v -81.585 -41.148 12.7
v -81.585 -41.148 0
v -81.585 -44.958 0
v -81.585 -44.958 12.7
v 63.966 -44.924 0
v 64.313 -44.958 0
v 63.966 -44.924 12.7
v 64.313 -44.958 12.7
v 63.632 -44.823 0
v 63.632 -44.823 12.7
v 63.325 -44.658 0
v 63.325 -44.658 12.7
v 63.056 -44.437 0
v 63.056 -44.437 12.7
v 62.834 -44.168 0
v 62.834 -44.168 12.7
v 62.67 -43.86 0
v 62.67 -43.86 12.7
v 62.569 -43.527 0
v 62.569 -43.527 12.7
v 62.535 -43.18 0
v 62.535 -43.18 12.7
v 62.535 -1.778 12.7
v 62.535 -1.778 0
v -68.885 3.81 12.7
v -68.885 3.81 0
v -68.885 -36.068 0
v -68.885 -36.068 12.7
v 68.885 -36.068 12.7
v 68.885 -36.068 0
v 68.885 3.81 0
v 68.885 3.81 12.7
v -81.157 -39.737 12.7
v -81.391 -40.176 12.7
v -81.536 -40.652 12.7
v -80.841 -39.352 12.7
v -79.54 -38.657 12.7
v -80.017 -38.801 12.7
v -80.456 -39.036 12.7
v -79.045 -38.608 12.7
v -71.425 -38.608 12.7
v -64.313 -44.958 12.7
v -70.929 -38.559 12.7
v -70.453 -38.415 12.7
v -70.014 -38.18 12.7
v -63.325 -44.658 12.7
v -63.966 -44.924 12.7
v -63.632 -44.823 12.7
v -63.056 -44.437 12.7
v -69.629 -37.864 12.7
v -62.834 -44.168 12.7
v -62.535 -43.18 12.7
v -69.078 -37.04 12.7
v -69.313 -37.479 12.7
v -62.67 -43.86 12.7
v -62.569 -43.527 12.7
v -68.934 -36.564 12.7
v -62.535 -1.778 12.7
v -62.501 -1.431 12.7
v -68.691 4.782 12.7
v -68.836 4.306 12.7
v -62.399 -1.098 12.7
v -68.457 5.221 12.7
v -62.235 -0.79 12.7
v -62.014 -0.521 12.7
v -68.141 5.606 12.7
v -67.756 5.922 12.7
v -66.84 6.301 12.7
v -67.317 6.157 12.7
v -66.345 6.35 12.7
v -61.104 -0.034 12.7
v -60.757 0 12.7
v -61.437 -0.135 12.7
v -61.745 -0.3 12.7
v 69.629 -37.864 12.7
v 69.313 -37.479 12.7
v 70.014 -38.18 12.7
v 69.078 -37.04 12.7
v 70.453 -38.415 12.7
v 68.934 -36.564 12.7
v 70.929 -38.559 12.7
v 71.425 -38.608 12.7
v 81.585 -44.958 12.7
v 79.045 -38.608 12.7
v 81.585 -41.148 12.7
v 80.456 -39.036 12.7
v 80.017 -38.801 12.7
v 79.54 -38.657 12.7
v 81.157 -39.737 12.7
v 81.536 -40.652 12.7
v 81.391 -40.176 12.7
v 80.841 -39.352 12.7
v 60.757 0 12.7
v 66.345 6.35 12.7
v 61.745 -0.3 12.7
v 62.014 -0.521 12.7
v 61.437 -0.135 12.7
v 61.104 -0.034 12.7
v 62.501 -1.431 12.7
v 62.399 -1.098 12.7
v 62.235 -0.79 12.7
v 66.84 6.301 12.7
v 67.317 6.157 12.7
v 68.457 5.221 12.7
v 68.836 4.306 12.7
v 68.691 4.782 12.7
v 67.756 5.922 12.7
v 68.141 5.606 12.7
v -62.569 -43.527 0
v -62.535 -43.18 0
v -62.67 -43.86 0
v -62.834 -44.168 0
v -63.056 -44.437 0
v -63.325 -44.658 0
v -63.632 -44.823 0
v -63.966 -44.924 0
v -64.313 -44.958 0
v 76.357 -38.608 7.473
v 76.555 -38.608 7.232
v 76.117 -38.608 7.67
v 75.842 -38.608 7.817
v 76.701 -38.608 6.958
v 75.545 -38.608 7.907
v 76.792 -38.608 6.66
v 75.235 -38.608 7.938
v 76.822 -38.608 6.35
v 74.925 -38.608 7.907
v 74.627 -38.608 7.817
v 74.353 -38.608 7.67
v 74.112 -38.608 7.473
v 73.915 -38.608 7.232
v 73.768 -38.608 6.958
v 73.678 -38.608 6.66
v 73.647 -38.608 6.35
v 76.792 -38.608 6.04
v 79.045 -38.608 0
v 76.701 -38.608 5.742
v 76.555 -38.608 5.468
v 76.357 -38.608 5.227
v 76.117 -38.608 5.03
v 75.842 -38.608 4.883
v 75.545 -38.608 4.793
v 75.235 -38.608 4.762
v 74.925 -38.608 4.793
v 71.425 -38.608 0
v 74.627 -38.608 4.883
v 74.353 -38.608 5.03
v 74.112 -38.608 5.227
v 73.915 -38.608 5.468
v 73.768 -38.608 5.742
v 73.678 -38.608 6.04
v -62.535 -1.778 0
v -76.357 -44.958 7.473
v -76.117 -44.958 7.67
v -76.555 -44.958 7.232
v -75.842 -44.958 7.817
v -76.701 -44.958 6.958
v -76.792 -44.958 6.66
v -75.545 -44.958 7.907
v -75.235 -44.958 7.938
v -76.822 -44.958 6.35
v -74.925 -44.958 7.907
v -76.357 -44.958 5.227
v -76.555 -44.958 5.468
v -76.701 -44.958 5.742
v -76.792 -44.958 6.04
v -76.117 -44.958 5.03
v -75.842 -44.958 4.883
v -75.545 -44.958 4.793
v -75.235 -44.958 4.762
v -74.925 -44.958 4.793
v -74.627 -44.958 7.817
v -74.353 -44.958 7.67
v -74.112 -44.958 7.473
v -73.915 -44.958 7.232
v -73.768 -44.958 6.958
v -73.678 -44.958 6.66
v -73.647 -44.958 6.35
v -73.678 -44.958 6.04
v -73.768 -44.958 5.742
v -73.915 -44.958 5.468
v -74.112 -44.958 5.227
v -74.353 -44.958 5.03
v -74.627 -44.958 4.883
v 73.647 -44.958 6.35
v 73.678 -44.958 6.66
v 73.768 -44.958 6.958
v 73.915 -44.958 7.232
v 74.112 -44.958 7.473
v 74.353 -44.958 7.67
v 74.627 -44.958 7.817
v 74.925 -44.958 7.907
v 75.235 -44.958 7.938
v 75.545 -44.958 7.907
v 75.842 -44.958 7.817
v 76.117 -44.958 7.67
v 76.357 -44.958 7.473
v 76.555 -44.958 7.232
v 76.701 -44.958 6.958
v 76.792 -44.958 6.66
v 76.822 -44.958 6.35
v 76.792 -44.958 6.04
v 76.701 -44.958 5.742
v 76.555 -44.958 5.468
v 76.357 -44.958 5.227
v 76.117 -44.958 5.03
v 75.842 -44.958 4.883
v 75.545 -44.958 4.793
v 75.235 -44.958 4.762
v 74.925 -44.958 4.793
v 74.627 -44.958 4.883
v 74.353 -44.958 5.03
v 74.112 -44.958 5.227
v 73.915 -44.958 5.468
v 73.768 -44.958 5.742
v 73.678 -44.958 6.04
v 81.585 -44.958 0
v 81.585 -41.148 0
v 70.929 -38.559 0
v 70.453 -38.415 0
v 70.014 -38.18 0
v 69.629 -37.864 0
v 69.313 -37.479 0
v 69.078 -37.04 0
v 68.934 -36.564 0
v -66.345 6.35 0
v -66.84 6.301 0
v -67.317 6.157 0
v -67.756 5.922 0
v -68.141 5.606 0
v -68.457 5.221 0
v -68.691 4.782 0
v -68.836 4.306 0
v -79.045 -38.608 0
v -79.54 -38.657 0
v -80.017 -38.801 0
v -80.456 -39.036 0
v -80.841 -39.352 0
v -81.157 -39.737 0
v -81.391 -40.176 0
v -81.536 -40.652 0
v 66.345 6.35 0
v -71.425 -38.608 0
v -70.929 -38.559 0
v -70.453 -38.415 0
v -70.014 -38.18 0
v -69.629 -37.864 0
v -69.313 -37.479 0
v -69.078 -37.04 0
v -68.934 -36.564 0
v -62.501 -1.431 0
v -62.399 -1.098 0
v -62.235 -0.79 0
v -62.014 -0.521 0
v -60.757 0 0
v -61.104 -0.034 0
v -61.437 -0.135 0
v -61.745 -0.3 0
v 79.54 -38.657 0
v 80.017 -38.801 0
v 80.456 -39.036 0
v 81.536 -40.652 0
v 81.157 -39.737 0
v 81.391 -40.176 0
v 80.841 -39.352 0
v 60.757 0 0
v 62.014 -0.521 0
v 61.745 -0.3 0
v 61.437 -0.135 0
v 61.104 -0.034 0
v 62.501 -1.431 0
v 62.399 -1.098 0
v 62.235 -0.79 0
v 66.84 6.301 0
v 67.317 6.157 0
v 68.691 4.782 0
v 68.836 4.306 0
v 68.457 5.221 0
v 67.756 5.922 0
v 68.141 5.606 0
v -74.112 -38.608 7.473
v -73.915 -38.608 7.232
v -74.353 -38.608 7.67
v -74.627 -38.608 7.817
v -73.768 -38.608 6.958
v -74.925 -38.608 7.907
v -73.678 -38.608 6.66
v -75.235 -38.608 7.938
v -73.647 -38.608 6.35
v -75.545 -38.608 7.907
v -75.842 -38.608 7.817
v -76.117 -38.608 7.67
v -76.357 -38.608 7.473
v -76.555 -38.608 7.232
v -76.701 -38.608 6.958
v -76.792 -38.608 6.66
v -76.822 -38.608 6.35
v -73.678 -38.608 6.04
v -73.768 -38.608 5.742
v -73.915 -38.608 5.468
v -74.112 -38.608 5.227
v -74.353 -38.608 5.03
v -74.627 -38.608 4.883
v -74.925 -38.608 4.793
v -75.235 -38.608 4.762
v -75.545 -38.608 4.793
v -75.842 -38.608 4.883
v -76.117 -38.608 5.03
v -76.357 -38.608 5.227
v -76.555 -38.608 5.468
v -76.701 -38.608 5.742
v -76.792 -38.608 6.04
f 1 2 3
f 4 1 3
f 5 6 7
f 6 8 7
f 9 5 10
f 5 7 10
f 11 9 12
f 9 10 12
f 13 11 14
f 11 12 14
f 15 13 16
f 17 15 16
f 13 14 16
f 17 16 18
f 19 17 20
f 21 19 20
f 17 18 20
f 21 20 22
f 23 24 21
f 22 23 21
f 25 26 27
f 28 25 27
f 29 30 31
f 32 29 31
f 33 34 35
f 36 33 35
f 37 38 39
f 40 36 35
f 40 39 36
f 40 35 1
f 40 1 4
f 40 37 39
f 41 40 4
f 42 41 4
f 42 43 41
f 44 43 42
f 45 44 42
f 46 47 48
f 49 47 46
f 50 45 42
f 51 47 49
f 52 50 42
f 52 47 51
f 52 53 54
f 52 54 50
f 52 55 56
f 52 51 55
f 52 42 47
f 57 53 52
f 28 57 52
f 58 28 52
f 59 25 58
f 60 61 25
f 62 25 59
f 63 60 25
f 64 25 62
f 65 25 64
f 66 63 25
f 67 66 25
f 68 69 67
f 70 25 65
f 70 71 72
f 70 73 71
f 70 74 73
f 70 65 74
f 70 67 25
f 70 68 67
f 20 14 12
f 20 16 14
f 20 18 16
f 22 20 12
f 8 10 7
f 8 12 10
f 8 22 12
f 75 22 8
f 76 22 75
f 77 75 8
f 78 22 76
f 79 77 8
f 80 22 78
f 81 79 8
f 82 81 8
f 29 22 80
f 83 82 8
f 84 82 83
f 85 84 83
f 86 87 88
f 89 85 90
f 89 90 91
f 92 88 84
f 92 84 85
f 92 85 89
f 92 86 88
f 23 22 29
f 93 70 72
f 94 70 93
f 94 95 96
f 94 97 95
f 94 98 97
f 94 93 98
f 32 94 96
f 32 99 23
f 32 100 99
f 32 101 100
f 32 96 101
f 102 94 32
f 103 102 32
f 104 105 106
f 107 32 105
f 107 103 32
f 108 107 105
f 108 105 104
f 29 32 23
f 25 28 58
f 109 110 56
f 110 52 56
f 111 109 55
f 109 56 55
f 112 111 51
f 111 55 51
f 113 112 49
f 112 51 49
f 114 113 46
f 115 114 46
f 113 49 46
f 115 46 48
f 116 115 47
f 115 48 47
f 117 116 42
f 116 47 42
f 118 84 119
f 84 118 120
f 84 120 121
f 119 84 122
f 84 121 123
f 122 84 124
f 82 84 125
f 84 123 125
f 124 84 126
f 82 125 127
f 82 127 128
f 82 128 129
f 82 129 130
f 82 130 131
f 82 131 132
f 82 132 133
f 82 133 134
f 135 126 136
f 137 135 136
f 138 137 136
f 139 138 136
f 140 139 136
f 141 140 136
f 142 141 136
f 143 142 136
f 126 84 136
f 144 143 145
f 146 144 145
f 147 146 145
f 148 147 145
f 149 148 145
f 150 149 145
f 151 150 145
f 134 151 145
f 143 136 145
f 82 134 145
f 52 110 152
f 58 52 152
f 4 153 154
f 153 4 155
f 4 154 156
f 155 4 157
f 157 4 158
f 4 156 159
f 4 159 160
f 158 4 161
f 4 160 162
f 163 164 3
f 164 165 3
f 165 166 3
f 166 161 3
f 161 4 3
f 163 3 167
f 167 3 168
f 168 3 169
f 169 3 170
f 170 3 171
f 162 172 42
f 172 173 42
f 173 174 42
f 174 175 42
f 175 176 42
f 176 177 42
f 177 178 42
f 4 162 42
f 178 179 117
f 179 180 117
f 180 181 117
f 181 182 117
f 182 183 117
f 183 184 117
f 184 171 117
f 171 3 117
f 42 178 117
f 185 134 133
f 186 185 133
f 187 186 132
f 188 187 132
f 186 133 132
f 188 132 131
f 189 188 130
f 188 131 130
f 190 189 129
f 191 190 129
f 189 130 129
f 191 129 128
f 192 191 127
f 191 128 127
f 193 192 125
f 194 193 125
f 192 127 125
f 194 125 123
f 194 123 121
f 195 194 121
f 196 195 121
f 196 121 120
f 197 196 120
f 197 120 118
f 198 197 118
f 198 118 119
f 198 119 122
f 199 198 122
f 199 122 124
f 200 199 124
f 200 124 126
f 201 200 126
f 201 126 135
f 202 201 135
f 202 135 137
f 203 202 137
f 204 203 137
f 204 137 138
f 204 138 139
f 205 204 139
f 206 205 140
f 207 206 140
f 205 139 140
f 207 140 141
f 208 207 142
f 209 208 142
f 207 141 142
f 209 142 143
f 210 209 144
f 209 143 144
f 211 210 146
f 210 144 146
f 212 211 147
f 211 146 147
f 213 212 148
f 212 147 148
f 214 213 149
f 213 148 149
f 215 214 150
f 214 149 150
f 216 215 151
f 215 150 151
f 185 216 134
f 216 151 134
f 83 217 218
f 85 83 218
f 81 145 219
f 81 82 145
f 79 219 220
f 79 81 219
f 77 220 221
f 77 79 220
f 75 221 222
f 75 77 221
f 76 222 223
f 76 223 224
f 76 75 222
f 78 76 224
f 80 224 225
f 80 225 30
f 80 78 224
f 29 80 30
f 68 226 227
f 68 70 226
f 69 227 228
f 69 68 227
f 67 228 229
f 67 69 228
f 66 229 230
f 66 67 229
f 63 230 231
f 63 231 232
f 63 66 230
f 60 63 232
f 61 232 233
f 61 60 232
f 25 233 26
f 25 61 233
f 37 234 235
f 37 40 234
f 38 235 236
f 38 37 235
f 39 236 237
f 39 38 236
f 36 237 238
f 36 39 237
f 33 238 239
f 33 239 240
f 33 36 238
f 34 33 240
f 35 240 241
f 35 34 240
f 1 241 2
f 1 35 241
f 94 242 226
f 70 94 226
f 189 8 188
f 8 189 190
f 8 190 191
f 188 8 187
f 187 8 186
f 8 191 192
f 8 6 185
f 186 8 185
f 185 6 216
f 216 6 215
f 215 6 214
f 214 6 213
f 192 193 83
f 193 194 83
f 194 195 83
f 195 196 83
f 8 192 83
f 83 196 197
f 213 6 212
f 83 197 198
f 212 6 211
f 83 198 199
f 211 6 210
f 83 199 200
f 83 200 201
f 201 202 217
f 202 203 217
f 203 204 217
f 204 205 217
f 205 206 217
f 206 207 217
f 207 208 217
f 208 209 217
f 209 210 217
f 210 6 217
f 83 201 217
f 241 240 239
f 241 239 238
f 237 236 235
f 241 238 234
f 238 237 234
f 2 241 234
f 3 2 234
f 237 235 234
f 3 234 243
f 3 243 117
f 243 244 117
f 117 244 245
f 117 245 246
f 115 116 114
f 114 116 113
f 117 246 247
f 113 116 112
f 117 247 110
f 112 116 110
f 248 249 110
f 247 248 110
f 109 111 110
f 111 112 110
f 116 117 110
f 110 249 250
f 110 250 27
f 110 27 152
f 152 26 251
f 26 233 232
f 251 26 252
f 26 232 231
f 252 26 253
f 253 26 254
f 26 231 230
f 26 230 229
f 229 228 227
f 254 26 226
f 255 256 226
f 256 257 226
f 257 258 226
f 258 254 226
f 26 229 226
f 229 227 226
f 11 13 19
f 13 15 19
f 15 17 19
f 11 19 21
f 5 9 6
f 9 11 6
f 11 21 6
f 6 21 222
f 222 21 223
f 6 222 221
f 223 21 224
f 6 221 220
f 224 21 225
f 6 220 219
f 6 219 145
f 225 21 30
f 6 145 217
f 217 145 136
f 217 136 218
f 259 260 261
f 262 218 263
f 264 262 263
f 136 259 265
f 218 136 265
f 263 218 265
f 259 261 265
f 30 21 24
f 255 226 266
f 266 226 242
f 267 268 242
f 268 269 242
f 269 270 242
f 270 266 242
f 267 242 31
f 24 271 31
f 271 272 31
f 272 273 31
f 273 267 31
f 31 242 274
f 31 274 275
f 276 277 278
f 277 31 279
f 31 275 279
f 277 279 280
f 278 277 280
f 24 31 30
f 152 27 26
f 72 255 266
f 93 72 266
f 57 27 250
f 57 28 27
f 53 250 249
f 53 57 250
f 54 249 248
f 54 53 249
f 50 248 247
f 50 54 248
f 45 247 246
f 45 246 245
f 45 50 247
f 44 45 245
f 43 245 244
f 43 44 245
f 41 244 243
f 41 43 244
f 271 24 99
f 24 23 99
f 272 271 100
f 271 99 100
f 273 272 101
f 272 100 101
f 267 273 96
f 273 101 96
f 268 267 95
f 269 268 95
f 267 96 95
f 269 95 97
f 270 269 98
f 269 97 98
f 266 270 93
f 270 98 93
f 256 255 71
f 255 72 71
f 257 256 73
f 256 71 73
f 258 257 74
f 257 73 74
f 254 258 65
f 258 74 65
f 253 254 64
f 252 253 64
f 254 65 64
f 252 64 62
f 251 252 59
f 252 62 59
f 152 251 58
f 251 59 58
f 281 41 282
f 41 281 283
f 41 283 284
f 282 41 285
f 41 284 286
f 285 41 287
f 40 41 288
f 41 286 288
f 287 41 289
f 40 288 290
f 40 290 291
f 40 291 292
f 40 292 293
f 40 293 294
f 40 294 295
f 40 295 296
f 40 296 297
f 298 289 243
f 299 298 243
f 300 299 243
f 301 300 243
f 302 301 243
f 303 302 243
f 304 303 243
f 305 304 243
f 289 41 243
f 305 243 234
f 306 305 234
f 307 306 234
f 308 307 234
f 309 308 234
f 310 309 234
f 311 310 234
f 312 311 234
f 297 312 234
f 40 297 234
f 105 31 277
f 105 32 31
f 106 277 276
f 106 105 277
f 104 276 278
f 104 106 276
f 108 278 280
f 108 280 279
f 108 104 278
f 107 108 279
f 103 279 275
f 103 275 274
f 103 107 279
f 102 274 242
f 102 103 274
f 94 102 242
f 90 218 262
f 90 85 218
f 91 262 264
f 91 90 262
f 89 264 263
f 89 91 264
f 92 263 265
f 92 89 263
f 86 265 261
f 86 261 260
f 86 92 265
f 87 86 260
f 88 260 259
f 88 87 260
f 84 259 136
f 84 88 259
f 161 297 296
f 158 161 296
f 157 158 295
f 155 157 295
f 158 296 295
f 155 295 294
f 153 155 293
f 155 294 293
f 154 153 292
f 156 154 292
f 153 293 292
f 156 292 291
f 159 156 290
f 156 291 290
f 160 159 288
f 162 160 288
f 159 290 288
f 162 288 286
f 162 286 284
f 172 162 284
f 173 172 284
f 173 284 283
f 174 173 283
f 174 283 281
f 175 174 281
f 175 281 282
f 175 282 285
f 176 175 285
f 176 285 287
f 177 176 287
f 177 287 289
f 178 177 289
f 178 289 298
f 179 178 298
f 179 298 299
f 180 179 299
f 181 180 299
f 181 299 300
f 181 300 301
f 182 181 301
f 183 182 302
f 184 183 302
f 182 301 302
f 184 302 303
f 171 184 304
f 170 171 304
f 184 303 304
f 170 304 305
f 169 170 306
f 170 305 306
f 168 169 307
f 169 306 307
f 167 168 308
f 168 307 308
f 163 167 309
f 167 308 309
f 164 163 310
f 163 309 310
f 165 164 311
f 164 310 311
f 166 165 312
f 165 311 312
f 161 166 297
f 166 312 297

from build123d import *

# Parameters (mm, degrees)
F1_DEPTH = 12.7
F3_R     = 1.5875
F4_DEPTH = 25.4
F2_R     = 1.5875
F5_DEPTH = 25.4
F6_R     = 2.54
F7_R     = 1.778


with BuildPart() as f1:
    # F0 (on Top) → F1 (new body)
    with BuildSketch(Plane.XY):
        Polygon((-62.5348, 0), (0, 0), (62.5348, 0), (62.5348, -44.958), (81.5848, -44.958), (81.5848, -38.608), (68.8848, -38.608), (68.8848, 0), (68.8848, 6.35), (0, 6.35), (-68.8848, 6.35), (-68.8848, 0), (-68.8848, -38.608), (-81.5848, -38.608), (-81.5848, -44.958), (-62.5348, -44.958), align=None)
    extrude(amount=F1_DEPTH)

    # F3 (on face) → F4 (cut)
    with BuildSketch(Plane(origin=(0, -38.608, 0), x_dir=(-1, 0, 0), z_dir=(0, 1, 0))):
        with Locations((75.2348, 6.35)):
            Circle(F3_R)
    extrude(amount=-F4_DEPTH, mode=Mode.SUBTRACT)

    # F2 (on face) → F5 (cut)
    with BuildSketch(Plane(origin=(0, -38.608, 0), x_dir=(-1, 0, 0), z_dir=(0, 1, 0))):
        with Locations((-75.2348, 6.35)):
            Circle(F2_R)
    extrude(amount=-F5_DEPTH, mode=Mode.SUBTRACT)

    # F6
    f6_edges = [f1.edges().sort_by_distance(p)[0] for p in [
        (81.5848, -38.608, 6.35),
        (68.8848, 6.35, 6.35),
        (68.8848, -38.608, 6.35),
        (-68.8848, 6.35, 6.35),
        (-68.8848, -38.608, 6.35),
        (-81.5848, -38.608, 6.35),
    ]]
    fillet(f6_edges, radius=F6_R)

    # F7
    f7_edges = [f1.edges().sort_by_distance(p)[0] for p in [
        (62.5348, 0, 6.35),
        (-62.5348, 0, 6.35),
        (-62.5348, -44.958, 6.35),
        (62.5348, -44.958, 6.35),
    ]]
    fillet(f7_edges, radius=F7_R)


solid = f1.part
